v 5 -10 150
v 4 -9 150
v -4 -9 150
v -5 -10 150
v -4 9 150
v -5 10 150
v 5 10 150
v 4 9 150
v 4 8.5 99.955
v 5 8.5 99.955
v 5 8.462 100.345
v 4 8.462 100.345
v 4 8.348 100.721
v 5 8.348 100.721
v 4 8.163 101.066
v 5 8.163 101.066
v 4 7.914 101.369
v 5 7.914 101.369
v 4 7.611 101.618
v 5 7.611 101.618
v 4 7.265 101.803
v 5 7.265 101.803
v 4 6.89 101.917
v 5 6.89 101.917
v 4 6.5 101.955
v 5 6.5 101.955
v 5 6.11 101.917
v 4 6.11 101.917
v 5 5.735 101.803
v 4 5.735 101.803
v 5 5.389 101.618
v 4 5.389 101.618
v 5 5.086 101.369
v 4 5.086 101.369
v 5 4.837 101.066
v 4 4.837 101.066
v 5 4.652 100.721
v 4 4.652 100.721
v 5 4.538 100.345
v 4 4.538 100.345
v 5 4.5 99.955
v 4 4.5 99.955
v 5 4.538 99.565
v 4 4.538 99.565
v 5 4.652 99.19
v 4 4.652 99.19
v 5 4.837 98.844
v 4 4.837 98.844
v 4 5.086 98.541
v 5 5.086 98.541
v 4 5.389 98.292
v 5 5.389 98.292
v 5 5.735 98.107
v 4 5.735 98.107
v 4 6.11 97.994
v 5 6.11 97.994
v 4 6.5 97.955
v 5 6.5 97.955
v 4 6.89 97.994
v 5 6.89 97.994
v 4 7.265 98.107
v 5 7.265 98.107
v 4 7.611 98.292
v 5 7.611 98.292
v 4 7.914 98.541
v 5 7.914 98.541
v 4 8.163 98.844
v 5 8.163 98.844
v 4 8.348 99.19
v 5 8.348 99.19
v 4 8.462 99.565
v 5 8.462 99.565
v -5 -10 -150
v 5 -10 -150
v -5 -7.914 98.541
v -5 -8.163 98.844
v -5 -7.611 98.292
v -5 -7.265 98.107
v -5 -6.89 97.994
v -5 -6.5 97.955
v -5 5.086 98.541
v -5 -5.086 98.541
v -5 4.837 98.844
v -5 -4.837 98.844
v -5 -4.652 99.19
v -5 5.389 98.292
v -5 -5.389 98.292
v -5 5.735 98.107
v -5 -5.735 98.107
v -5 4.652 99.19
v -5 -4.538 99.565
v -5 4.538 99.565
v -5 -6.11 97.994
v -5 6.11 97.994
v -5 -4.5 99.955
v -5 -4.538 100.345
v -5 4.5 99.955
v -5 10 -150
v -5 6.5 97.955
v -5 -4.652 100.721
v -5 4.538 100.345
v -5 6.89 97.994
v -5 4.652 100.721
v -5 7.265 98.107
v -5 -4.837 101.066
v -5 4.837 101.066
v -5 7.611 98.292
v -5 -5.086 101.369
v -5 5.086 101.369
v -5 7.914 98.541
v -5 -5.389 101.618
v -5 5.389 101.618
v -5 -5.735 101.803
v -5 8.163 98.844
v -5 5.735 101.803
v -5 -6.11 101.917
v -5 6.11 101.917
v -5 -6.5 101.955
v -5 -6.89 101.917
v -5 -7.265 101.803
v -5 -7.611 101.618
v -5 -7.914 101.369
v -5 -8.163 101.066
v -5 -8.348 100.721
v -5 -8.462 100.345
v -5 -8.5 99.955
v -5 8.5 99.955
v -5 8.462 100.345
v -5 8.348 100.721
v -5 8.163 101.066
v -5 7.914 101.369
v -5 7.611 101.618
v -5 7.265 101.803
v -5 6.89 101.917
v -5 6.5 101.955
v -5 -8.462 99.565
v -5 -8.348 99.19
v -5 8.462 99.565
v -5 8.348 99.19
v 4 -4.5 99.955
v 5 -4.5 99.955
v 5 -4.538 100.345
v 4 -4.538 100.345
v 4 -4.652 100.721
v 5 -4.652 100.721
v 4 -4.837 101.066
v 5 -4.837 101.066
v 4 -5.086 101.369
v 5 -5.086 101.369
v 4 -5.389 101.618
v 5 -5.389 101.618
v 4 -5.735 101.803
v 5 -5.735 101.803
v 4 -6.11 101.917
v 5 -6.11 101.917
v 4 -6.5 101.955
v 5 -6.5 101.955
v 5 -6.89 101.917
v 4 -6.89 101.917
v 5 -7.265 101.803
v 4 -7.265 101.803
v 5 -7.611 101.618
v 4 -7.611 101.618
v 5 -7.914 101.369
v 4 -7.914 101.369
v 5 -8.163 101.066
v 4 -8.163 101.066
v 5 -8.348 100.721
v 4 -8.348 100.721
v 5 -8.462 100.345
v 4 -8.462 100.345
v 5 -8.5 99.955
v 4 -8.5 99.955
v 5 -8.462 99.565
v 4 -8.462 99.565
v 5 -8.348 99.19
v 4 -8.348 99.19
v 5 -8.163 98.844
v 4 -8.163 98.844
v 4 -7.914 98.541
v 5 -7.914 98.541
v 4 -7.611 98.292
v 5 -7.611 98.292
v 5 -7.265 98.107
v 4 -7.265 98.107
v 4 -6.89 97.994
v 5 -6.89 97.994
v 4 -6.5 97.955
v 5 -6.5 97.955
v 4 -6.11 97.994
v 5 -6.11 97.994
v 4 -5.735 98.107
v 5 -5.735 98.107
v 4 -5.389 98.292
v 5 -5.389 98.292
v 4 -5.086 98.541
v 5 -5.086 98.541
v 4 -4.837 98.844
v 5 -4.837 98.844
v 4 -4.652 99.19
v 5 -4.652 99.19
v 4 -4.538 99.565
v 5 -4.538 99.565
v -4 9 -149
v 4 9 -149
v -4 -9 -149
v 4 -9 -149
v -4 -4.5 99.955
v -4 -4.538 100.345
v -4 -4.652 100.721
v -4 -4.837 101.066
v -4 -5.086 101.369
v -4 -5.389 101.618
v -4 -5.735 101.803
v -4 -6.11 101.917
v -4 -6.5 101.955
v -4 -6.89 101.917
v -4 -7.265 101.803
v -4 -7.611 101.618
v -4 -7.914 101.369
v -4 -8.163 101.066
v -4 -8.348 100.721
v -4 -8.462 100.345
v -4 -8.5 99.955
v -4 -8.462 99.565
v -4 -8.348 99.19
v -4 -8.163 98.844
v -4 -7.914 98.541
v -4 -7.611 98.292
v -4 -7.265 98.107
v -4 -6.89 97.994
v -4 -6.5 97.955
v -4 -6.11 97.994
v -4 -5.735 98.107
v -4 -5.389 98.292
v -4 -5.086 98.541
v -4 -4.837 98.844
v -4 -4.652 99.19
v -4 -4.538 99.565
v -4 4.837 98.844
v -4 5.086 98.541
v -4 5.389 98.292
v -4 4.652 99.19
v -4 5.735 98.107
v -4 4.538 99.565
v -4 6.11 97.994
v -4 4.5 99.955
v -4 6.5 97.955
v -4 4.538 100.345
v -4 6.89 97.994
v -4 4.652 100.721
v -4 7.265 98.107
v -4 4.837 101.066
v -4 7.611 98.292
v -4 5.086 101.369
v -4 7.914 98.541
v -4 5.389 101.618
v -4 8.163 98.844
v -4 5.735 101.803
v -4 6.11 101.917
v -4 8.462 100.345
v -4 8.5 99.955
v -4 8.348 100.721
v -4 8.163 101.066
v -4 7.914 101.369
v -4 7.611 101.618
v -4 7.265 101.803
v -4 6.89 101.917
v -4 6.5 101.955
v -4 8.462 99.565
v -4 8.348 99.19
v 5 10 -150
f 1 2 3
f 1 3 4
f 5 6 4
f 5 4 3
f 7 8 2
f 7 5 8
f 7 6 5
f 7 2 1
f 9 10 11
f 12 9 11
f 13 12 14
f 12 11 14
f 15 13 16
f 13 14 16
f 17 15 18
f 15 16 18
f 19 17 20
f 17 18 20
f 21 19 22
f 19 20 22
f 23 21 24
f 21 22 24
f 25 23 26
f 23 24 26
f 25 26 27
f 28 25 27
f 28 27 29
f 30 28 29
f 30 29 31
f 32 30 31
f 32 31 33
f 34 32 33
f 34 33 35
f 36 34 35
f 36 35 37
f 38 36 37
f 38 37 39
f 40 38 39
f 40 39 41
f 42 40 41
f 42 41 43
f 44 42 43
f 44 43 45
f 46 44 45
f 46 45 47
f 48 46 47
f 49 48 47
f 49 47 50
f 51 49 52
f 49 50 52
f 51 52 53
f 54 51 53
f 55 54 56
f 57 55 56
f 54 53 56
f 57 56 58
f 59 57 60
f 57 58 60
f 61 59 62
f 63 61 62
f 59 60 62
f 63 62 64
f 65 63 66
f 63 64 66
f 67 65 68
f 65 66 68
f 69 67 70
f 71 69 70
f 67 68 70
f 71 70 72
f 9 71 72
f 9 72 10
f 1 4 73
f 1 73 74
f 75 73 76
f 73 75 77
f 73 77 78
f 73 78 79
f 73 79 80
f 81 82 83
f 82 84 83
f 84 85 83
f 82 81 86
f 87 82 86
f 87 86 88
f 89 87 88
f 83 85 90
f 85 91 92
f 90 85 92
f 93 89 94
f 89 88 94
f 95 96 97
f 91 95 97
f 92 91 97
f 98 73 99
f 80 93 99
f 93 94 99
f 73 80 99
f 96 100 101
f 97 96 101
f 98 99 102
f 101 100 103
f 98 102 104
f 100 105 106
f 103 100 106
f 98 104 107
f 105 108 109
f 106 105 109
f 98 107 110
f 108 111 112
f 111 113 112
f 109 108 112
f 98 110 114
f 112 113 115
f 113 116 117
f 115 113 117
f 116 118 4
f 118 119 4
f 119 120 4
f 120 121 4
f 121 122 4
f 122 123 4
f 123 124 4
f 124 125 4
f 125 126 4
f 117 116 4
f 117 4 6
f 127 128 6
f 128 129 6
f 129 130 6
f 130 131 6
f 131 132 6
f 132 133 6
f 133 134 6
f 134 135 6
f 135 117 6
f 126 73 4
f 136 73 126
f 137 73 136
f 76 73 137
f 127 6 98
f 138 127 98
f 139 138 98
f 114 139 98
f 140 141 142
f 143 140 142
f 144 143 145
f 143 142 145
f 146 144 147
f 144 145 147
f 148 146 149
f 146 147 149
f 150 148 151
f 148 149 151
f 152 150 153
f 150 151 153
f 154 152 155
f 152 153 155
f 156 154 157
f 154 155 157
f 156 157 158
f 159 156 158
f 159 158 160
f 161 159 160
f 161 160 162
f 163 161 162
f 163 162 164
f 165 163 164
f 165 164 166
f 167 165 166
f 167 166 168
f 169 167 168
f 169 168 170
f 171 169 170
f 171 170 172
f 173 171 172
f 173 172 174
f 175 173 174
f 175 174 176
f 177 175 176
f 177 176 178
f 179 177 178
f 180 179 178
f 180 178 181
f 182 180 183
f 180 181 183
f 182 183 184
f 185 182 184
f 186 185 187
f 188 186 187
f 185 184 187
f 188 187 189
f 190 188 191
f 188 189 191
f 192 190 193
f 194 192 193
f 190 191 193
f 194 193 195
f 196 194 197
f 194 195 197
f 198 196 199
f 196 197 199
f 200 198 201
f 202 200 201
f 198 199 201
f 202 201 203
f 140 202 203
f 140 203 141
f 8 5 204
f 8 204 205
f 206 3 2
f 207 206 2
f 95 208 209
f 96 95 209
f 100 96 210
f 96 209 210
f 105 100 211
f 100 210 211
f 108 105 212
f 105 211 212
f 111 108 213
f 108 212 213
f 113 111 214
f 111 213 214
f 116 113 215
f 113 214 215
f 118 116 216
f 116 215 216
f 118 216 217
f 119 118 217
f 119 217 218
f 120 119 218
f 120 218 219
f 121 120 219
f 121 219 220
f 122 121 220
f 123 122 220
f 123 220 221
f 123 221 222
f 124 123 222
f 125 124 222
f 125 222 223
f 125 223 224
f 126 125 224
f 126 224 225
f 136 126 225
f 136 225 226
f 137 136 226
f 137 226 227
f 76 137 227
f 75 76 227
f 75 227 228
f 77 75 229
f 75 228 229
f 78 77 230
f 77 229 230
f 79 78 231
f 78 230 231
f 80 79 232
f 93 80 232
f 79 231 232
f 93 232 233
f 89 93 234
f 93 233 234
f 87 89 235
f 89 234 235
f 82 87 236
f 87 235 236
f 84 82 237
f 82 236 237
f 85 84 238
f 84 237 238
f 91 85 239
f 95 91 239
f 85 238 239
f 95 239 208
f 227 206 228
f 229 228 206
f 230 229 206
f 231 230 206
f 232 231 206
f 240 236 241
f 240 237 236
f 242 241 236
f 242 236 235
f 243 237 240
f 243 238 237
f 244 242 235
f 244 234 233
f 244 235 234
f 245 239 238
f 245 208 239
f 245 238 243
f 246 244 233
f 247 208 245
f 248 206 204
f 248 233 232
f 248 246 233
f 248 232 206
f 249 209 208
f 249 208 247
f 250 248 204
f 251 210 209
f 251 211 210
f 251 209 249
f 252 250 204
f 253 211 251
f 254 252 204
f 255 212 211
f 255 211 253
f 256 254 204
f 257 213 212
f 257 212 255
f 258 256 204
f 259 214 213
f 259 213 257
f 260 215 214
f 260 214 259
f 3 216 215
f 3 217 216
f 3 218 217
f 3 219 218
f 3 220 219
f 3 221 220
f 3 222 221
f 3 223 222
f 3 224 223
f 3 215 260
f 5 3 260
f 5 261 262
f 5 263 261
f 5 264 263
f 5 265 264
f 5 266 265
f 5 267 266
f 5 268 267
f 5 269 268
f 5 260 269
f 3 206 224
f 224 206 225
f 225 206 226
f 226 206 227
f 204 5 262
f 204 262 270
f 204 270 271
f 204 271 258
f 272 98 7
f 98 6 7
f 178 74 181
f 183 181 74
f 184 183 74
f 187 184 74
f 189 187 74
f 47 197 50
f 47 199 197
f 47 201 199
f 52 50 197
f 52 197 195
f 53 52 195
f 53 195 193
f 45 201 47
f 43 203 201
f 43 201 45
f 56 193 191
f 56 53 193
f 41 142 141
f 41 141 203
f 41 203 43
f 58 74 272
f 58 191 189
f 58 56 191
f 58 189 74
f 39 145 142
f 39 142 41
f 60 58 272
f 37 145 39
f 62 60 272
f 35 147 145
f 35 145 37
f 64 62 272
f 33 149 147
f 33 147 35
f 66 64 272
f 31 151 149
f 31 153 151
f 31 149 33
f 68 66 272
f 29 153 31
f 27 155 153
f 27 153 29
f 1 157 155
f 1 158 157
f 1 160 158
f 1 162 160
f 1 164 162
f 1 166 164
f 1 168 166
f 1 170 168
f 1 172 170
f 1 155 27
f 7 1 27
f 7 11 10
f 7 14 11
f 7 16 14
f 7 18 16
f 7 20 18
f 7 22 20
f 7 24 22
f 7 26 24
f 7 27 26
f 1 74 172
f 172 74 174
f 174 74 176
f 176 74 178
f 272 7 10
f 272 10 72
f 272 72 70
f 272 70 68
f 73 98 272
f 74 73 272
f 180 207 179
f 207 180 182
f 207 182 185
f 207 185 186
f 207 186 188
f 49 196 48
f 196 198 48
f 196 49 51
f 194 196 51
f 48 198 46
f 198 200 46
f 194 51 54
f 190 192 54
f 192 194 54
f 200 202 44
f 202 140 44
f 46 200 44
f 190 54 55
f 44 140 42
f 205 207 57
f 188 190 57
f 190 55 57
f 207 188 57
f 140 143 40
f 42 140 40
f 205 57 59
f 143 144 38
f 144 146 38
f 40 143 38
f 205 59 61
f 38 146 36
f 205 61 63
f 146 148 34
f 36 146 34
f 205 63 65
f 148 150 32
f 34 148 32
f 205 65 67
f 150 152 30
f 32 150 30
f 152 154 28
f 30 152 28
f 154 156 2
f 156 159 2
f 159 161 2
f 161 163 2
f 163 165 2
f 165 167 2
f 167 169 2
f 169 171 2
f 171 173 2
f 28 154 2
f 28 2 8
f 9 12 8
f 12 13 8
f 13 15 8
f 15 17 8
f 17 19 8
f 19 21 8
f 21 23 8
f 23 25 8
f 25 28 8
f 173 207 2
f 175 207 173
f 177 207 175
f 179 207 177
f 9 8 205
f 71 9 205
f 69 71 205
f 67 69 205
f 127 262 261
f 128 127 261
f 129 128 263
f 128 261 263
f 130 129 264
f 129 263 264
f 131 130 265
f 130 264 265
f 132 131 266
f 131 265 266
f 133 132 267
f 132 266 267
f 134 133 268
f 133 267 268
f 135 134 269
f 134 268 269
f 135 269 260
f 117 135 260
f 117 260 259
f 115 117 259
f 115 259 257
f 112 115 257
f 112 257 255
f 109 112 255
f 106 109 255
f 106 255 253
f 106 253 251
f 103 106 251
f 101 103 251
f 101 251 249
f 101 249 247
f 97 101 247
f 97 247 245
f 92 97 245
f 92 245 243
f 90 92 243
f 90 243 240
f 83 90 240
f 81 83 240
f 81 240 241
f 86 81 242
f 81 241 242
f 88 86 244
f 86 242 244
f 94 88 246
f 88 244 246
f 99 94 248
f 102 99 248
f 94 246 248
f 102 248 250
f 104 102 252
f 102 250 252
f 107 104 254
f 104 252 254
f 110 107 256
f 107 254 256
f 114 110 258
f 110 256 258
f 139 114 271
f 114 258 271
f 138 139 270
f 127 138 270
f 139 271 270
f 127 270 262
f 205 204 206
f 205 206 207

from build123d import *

# Parameters (mm, degrees)
IZIM1_W                     = 10
IZIM1_H                     = 20
Y_KSEKLIK_EKSTR_ZYON1_DEPTH = 150
BO_ALTMA1_T                 = -1
IZIM4_R                     = 2
KES_EKSTR_ZYON3_DEPTH       = 18


with BuildPart() as part:
    # Çizim1 → Yükseklik-Ekstrüzyon1 (new, symmetric)
    with BuildSketch(Plane.XY):
        Rectangle(IZIM1_W, IZIM1_H)
    extrude(amount=Y_KSEKLIK_EKSTR_ZYON1_DEPTH, both=True)

    # İç Boşaltma1
    bo_altma1_openings = [part.faces().sort_by_distance(p)[0] for p in [
        (0, 0, 150),
    ]]
    offset(amount=BO_ALTMA1_T, openings=bo_altma1_openings, kind=Kind.INTERSECTION)

    # Çizim4 → Kes-Ekstrüzyon3 (cut)
    with BuildSketch(Plane(origin=(5, 0, 0), x_dir=(0, 0, -1), z_dir=(1, 0, 0))):
        with Locations(Location((-99.95519869, 6.5, 0), (0, 0, 90))):
            Circle(IZIM4_R)
        with Locations(Location((-99.95519869, -6.5, 0), (0, 0, 90))):
            Circle(IZIM4_R)
    extrude(amount=-KES_EKSTR_ZYON3_DEPTH, mode=Mode.SUBTRACT)


solid = part.part
